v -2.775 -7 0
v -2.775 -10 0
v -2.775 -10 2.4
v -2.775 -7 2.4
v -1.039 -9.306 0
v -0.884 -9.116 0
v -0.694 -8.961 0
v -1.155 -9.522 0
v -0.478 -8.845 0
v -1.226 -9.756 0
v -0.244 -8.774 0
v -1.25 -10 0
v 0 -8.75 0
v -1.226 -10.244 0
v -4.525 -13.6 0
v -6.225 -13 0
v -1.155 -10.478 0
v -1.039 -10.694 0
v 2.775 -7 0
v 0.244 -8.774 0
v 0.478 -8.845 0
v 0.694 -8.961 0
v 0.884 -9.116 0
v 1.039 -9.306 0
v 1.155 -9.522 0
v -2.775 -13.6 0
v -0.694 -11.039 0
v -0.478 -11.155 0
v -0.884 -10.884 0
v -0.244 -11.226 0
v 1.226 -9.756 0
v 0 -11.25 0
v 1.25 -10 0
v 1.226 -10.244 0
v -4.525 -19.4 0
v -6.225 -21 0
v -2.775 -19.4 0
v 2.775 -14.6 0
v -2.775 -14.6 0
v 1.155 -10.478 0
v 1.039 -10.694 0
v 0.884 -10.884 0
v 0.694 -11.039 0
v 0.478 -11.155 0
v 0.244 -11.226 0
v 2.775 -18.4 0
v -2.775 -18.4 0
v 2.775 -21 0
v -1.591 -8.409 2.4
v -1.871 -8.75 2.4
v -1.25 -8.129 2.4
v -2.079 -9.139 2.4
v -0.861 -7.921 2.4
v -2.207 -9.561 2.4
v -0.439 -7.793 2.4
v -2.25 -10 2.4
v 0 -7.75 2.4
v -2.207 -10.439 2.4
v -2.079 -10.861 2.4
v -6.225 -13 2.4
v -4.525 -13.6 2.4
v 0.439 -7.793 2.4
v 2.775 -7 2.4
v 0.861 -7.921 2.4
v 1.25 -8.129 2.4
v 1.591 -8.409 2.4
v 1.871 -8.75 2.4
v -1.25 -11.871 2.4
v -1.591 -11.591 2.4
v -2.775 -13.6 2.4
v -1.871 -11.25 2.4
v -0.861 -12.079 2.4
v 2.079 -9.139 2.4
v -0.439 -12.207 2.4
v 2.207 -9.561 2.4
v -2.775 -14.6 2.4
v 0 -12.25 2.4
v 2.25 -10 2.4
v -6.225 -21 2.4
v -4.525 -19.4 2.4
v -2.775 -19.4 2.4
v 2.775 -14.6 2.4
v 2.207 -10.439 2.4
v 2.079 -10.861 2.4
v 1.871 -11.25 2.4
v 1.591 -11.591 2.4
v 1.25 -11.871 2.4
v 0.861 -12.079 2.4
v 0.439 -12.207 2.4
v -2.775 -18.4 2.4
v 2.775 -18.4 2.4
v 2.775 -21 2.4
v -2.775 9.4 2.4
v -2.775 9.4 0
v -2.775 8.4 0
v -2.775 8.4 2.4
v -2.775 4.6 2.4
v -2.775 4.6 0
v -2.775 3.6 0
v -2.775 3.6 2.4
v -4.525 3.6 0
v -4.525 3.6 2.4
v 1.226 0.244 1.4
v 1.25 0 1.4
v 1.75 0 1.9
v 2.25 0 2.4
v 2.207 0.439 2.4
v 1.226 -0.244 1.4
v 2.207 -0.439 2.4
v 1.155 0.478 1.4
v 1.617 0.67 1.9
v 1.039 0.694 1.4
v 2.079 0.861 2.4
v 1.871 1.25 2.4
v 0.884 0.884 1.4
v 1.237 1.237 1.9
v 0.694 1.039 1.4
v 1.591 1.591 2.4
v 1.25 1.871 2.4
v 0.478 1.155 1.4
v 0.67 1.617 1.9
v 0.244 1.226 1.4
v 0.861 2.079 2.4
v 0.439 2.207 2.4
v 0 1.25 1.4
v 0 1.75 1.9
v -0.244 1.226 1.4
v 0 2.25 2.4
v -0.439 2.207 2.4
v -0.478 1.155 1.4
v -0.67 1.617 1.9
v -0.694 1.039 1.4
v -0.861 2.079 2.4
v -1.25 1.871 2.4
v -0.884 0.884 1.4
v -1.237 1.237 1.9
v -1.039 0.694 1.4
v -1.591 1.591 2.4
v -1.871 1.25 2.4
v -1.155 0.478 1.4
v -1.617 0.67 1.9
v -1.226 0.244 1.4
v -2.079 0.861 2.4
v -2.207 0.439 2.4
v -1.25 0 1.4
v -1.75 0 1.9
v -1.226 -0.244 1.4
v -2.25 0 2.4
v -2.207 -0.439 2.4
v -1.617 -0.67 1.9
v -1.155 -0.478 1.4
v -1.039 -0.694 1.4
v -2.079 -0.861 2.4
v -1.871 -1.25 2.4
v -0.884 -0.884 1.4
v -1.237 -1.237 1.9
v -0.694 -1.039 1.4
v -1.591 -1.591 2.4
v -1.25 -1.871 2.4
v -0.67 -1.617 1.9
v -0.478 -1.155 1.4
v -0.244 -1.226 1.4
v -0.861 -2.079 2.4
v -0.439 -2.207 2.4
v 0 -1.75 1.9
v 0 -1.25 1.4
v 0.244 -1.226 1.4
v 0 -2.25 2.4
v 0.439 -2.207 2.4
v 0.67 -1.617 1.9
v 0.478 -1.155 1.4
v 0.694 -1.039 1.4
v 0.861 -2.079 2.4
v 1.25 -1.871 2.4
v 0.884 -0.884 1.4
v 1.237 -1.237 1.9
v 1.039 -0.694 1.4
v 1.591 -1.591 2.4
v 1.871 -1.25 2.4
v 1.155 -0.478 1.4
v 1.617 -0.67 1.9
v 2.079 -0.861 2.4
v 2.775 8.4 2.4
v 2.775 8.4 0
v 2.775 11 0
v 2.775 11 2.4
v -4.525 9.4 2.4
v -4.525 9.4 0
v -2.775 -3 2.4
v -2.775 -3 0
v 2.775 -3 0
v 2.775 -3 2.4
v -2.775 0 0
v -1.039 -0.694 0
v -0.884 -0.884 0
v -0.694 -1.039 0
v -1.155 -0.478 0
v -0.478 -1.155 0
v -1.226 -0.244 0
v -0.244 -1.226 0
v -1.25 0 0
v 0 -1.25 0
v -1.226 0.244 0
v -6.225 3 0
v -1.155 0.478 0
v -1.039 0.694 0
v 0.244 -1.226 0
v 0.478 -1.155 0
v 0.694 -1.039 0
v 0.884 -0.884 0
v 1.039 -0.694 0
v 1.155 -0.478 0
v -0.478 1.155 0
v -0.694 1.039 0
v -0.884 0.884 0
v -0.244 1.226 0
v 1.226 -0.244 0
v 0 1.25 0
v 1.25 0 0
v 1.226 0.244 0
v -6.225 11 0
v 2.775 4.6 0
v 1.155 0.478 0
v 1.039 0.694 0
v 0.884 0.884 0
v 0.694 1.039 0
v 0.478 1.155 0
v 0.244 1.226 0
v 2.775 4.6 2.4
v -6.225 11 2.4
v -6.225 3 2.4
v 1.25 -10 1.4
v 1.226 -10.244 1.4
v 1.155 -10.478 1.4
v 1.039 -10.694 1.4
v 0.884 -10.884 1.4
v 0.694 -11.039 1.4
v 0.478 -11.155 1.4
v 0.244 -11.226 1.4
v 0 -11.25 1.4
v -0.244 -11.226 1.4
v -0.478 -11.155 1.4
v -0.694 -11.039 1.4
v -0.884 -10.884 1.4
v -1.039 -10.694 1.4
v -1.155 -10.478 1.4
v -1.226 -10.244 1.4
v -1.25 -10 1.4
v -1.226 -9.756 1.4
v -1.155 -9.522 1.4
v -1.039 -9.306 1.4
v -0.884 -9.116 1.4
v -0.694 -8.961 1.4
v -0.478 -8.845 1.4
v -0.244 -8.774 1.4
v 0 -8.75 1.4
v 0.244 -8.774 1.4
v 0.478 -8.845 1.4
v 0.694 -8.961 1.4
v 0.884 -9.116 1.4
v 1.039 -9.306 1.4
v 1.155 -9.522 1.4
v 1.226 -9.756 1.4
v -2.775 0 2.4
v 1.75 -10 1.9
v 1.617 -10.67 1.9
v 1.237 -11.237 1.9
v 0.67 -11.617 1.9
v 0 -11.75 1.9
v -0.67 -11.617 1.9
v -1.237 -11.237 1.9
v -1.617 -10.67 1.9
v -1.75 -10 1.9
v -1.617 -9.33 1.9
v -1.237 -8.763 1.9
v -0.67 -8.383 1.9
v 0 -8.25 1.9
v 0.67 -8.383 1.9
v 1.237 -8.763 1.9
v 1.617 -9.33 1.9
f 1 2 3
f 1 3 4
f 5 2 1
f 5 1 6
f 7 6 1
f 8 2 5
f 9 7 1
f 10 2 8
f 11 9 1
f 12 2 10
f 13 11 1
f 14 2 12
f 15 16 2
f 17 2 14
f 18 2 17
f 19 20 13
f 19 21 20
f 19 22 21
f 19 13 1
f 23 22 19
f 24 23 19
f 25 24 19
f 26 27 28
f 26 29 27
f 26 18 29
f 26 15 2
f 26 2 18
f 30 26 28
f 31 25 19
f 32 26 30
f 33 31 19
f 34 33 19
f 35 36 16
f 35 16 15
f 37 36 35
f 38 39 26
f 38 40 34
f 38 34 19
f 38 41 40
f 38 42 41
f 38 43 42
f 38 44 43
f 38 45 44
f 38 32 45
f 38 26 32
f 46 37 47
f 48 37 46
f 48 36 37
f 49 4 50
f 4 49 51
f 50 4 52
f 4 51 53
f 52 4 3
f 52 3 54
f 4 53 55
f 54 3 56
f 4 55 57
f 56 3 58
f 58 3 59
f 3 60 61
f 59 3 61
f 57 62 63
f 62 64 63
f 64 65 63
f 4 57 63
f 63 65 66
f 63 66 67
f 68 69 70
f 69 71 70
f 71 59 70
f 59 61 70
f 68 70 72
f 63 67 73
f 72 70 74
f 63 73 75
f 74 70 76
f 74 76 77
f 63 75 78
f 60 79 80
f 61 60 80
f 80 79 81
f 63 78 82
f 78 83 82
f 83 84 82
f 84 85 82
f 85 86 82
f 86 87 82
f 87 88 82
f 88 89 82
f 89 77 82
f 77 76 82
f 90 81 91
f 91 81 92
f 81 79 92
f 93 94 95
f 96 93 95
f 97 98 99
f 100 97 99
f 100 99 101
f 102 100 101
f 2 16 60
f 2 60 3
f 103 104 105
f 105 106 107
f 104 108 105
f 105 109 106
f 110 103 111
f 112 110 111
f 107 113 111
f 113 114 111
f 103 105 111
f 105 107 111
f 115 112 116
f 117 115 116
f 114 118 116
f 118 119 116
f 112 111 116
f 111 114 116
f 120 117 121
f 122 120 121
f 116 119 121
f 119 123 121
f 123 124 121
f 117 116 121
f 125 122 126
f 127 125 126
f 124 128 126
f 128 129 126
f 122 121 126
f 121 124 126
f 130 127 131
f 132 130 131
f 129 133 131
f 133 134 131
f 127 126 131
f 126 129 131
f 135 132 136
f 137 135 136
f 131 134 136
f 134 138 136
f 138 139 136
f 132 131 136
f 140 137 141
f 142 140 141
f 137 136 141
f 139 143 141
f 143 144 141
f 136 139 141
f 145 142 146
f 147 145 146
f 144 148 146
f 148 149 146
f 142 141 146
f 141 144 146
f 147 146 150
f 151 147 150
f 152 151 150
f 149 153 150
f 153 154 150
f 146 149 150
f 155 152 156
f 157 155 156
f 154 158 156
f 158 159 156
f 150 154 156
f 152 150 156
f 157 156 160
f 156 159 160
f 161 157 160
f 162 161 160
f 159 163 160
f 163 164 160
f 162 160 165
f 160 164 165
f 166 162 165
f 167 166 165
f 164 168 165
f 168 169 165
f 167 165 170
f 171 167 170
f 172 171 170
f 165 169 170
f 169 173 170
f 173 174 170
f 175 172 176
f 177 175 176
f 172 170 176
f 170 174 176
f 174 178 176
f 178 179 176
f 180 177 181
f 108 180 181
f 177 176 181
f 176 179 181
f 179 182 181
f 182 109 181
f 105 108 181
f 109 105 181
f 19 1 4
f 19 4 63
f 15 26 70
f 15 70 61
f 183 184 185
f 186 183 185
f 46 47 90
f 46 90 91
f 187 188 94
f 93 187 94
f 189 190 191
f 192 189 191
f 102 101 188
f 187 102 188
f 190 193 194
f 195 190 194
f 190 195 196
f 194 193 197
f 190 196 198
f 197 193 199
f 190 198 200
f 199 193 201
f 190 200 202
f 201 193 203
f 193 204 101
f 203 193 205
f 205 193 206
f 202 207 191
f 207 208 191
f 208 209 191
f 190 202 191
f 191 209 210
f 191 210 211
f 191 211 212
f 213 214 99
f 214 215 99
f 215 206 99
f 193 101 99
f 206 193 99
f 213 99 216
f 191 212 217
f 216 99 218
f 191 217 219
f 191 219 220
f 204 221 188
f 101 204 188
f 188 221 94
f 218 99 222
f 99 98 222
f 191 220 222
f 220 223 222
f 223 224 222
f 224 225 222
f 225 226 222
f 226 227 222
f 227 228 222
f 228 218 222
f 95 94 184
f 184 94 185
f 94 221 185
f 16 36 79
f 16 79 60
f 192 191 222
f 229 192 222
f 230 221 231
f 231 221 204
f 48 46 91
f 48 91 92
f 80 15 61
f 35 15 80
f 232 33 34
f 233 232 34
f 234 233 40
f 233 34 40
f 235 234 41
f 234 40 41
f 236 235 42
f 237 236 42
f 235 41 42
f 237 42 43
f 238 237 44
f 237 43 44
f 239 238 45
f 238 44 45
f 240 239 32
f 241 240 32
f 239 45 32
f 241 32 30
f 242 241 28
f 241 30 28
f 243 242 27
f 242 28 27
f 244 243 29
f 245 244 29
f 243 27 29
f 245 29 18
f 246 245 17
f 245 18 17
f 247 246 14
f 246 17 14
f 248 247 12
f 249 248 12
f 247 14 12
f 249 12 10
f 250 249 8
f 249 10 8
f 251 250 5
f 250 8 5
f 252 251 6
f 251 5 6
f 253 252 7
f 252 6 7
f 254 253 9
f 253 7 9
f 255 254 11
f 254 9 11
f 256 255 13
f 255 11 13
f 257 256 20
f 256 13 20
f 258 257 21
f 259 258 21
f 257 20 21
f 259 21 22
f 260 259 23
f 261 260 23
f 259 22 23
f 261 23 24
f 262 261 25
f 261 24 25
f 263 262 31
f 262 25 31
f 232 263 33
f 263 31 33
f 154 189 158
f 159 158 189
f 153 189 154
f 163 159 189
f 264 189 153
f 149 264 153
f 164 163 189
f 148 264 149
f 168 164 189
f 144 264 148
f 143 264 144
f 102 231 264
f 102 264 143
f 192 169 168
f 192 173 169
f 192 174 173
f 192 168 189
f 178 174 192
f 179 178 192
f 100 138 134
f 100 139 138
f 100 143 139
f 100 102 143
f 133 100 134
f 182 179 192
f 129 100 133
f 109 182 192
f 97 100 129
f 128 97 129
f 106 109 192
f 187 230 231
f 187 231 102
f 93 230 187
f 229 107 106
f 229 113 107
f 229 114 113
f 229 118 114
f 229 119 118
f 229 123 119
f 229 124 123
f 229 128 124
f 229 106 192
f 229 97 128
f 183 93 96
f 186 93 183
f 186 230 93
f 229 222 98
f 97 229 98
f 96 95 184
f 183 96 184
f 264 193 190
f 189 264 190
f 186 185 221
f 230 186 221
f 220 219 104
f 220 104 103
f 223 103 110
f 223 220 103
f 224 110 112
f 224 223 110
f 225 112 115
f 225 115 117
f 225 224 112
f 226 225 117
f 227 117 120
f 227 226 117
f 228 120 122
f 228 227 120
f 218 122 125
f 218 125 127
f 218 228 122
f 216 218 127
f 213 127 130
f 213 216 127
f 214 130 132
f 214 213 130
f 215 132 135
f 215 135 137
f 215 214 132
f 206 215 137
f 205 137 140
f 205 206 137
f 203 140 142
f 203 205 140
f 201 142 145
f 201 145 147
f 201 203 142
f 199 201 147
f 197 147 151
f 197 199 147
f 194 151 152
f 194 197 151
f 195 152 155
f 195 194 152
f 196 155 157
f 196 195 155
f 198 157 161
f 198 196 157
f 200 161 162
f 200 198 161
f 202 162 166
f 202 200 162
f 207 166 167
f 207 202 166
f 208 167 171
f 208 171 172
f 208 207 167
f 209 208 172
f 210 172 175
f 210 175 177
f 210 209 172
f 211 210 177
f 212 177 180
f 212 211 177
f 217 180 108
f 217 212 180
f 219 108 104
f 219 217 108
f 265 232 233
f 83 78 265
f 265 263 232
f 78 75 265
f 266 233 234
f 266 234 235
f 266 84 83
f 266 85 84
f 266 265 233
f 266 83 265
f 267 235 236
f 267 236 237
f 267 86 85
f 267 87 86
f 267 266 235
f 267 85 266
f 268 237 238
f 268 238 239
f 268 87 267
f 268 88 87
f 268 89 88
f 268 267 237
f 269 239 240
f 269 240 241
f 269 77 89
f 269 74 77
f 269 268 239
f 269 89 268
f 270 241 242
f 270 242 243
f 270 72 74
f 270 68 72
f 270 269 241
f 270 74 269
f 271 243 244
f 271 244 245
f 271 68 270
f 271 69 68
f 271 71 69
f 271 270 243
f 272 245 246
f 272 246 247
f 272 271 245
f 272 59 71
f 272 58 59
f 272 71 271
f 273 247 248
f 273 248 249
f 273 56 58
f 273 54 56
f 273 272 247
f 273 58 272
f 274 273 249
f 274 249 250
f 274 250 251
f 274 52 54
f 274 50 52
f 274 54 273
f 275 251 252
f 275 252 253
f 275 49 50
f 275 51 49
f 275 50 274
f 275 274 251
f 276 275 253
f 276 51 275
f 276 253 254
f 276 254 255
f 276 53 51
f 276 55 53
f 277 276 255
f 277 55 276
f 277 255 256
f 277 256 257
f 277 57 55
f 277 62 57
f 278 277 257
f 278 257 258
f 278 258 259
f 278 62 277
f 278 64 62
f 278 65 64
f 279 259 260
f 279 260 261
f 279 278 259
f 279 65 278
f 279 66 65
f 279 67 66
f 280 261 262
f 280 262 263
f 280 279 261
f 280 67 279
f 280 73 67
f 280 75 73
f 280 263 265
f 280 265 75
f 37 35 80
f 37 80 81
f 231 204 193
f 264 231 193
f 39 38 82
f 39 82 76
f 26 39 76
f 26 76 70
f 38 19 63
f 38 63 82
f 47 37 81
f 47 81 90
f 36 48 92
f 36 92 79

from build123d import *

# Parameters (mm, degrees)
F0_R     = 1.25
F1_DEPTH = 2.4
F2_SIZE  = 1


with BuildPart() as f1:
    # F0 (on Top) → F1 (new body)
    with BuildSketch(Plane.XY):
        Polygon((-2.775, -3), (2.775, -3), (2.775, 3), (2.775, 4.6), (-2.775, 4.6), (-2.775, 3.6), (-4.525, 3.6), (-4.525, 9.4), (-2.775, 9.4), (-2.775, 8.4), (2.775, 8.4), (2.775, 11), (-6.225, 11), (-6.225, 3), (-2.775, 0), align=None)
        Circle(F0_R, mode=Mode.SUBTRACT)
    extrude(amount=F1_DEPTH)

    # F2
    f2_edges = [f1.edges().sort_by_distance(p)[0] for p in [
        (-1.25, 0, 2.4),
    ]]
    chamfer(f2_edges, length=F2_SIZE)


with BuildPart() as f4_1:
    # F4: instance of F1
    add(f1.part.mirror(Plane.XZ.offset(5)))


solid = Compound([f1.part, f4_1.part])
